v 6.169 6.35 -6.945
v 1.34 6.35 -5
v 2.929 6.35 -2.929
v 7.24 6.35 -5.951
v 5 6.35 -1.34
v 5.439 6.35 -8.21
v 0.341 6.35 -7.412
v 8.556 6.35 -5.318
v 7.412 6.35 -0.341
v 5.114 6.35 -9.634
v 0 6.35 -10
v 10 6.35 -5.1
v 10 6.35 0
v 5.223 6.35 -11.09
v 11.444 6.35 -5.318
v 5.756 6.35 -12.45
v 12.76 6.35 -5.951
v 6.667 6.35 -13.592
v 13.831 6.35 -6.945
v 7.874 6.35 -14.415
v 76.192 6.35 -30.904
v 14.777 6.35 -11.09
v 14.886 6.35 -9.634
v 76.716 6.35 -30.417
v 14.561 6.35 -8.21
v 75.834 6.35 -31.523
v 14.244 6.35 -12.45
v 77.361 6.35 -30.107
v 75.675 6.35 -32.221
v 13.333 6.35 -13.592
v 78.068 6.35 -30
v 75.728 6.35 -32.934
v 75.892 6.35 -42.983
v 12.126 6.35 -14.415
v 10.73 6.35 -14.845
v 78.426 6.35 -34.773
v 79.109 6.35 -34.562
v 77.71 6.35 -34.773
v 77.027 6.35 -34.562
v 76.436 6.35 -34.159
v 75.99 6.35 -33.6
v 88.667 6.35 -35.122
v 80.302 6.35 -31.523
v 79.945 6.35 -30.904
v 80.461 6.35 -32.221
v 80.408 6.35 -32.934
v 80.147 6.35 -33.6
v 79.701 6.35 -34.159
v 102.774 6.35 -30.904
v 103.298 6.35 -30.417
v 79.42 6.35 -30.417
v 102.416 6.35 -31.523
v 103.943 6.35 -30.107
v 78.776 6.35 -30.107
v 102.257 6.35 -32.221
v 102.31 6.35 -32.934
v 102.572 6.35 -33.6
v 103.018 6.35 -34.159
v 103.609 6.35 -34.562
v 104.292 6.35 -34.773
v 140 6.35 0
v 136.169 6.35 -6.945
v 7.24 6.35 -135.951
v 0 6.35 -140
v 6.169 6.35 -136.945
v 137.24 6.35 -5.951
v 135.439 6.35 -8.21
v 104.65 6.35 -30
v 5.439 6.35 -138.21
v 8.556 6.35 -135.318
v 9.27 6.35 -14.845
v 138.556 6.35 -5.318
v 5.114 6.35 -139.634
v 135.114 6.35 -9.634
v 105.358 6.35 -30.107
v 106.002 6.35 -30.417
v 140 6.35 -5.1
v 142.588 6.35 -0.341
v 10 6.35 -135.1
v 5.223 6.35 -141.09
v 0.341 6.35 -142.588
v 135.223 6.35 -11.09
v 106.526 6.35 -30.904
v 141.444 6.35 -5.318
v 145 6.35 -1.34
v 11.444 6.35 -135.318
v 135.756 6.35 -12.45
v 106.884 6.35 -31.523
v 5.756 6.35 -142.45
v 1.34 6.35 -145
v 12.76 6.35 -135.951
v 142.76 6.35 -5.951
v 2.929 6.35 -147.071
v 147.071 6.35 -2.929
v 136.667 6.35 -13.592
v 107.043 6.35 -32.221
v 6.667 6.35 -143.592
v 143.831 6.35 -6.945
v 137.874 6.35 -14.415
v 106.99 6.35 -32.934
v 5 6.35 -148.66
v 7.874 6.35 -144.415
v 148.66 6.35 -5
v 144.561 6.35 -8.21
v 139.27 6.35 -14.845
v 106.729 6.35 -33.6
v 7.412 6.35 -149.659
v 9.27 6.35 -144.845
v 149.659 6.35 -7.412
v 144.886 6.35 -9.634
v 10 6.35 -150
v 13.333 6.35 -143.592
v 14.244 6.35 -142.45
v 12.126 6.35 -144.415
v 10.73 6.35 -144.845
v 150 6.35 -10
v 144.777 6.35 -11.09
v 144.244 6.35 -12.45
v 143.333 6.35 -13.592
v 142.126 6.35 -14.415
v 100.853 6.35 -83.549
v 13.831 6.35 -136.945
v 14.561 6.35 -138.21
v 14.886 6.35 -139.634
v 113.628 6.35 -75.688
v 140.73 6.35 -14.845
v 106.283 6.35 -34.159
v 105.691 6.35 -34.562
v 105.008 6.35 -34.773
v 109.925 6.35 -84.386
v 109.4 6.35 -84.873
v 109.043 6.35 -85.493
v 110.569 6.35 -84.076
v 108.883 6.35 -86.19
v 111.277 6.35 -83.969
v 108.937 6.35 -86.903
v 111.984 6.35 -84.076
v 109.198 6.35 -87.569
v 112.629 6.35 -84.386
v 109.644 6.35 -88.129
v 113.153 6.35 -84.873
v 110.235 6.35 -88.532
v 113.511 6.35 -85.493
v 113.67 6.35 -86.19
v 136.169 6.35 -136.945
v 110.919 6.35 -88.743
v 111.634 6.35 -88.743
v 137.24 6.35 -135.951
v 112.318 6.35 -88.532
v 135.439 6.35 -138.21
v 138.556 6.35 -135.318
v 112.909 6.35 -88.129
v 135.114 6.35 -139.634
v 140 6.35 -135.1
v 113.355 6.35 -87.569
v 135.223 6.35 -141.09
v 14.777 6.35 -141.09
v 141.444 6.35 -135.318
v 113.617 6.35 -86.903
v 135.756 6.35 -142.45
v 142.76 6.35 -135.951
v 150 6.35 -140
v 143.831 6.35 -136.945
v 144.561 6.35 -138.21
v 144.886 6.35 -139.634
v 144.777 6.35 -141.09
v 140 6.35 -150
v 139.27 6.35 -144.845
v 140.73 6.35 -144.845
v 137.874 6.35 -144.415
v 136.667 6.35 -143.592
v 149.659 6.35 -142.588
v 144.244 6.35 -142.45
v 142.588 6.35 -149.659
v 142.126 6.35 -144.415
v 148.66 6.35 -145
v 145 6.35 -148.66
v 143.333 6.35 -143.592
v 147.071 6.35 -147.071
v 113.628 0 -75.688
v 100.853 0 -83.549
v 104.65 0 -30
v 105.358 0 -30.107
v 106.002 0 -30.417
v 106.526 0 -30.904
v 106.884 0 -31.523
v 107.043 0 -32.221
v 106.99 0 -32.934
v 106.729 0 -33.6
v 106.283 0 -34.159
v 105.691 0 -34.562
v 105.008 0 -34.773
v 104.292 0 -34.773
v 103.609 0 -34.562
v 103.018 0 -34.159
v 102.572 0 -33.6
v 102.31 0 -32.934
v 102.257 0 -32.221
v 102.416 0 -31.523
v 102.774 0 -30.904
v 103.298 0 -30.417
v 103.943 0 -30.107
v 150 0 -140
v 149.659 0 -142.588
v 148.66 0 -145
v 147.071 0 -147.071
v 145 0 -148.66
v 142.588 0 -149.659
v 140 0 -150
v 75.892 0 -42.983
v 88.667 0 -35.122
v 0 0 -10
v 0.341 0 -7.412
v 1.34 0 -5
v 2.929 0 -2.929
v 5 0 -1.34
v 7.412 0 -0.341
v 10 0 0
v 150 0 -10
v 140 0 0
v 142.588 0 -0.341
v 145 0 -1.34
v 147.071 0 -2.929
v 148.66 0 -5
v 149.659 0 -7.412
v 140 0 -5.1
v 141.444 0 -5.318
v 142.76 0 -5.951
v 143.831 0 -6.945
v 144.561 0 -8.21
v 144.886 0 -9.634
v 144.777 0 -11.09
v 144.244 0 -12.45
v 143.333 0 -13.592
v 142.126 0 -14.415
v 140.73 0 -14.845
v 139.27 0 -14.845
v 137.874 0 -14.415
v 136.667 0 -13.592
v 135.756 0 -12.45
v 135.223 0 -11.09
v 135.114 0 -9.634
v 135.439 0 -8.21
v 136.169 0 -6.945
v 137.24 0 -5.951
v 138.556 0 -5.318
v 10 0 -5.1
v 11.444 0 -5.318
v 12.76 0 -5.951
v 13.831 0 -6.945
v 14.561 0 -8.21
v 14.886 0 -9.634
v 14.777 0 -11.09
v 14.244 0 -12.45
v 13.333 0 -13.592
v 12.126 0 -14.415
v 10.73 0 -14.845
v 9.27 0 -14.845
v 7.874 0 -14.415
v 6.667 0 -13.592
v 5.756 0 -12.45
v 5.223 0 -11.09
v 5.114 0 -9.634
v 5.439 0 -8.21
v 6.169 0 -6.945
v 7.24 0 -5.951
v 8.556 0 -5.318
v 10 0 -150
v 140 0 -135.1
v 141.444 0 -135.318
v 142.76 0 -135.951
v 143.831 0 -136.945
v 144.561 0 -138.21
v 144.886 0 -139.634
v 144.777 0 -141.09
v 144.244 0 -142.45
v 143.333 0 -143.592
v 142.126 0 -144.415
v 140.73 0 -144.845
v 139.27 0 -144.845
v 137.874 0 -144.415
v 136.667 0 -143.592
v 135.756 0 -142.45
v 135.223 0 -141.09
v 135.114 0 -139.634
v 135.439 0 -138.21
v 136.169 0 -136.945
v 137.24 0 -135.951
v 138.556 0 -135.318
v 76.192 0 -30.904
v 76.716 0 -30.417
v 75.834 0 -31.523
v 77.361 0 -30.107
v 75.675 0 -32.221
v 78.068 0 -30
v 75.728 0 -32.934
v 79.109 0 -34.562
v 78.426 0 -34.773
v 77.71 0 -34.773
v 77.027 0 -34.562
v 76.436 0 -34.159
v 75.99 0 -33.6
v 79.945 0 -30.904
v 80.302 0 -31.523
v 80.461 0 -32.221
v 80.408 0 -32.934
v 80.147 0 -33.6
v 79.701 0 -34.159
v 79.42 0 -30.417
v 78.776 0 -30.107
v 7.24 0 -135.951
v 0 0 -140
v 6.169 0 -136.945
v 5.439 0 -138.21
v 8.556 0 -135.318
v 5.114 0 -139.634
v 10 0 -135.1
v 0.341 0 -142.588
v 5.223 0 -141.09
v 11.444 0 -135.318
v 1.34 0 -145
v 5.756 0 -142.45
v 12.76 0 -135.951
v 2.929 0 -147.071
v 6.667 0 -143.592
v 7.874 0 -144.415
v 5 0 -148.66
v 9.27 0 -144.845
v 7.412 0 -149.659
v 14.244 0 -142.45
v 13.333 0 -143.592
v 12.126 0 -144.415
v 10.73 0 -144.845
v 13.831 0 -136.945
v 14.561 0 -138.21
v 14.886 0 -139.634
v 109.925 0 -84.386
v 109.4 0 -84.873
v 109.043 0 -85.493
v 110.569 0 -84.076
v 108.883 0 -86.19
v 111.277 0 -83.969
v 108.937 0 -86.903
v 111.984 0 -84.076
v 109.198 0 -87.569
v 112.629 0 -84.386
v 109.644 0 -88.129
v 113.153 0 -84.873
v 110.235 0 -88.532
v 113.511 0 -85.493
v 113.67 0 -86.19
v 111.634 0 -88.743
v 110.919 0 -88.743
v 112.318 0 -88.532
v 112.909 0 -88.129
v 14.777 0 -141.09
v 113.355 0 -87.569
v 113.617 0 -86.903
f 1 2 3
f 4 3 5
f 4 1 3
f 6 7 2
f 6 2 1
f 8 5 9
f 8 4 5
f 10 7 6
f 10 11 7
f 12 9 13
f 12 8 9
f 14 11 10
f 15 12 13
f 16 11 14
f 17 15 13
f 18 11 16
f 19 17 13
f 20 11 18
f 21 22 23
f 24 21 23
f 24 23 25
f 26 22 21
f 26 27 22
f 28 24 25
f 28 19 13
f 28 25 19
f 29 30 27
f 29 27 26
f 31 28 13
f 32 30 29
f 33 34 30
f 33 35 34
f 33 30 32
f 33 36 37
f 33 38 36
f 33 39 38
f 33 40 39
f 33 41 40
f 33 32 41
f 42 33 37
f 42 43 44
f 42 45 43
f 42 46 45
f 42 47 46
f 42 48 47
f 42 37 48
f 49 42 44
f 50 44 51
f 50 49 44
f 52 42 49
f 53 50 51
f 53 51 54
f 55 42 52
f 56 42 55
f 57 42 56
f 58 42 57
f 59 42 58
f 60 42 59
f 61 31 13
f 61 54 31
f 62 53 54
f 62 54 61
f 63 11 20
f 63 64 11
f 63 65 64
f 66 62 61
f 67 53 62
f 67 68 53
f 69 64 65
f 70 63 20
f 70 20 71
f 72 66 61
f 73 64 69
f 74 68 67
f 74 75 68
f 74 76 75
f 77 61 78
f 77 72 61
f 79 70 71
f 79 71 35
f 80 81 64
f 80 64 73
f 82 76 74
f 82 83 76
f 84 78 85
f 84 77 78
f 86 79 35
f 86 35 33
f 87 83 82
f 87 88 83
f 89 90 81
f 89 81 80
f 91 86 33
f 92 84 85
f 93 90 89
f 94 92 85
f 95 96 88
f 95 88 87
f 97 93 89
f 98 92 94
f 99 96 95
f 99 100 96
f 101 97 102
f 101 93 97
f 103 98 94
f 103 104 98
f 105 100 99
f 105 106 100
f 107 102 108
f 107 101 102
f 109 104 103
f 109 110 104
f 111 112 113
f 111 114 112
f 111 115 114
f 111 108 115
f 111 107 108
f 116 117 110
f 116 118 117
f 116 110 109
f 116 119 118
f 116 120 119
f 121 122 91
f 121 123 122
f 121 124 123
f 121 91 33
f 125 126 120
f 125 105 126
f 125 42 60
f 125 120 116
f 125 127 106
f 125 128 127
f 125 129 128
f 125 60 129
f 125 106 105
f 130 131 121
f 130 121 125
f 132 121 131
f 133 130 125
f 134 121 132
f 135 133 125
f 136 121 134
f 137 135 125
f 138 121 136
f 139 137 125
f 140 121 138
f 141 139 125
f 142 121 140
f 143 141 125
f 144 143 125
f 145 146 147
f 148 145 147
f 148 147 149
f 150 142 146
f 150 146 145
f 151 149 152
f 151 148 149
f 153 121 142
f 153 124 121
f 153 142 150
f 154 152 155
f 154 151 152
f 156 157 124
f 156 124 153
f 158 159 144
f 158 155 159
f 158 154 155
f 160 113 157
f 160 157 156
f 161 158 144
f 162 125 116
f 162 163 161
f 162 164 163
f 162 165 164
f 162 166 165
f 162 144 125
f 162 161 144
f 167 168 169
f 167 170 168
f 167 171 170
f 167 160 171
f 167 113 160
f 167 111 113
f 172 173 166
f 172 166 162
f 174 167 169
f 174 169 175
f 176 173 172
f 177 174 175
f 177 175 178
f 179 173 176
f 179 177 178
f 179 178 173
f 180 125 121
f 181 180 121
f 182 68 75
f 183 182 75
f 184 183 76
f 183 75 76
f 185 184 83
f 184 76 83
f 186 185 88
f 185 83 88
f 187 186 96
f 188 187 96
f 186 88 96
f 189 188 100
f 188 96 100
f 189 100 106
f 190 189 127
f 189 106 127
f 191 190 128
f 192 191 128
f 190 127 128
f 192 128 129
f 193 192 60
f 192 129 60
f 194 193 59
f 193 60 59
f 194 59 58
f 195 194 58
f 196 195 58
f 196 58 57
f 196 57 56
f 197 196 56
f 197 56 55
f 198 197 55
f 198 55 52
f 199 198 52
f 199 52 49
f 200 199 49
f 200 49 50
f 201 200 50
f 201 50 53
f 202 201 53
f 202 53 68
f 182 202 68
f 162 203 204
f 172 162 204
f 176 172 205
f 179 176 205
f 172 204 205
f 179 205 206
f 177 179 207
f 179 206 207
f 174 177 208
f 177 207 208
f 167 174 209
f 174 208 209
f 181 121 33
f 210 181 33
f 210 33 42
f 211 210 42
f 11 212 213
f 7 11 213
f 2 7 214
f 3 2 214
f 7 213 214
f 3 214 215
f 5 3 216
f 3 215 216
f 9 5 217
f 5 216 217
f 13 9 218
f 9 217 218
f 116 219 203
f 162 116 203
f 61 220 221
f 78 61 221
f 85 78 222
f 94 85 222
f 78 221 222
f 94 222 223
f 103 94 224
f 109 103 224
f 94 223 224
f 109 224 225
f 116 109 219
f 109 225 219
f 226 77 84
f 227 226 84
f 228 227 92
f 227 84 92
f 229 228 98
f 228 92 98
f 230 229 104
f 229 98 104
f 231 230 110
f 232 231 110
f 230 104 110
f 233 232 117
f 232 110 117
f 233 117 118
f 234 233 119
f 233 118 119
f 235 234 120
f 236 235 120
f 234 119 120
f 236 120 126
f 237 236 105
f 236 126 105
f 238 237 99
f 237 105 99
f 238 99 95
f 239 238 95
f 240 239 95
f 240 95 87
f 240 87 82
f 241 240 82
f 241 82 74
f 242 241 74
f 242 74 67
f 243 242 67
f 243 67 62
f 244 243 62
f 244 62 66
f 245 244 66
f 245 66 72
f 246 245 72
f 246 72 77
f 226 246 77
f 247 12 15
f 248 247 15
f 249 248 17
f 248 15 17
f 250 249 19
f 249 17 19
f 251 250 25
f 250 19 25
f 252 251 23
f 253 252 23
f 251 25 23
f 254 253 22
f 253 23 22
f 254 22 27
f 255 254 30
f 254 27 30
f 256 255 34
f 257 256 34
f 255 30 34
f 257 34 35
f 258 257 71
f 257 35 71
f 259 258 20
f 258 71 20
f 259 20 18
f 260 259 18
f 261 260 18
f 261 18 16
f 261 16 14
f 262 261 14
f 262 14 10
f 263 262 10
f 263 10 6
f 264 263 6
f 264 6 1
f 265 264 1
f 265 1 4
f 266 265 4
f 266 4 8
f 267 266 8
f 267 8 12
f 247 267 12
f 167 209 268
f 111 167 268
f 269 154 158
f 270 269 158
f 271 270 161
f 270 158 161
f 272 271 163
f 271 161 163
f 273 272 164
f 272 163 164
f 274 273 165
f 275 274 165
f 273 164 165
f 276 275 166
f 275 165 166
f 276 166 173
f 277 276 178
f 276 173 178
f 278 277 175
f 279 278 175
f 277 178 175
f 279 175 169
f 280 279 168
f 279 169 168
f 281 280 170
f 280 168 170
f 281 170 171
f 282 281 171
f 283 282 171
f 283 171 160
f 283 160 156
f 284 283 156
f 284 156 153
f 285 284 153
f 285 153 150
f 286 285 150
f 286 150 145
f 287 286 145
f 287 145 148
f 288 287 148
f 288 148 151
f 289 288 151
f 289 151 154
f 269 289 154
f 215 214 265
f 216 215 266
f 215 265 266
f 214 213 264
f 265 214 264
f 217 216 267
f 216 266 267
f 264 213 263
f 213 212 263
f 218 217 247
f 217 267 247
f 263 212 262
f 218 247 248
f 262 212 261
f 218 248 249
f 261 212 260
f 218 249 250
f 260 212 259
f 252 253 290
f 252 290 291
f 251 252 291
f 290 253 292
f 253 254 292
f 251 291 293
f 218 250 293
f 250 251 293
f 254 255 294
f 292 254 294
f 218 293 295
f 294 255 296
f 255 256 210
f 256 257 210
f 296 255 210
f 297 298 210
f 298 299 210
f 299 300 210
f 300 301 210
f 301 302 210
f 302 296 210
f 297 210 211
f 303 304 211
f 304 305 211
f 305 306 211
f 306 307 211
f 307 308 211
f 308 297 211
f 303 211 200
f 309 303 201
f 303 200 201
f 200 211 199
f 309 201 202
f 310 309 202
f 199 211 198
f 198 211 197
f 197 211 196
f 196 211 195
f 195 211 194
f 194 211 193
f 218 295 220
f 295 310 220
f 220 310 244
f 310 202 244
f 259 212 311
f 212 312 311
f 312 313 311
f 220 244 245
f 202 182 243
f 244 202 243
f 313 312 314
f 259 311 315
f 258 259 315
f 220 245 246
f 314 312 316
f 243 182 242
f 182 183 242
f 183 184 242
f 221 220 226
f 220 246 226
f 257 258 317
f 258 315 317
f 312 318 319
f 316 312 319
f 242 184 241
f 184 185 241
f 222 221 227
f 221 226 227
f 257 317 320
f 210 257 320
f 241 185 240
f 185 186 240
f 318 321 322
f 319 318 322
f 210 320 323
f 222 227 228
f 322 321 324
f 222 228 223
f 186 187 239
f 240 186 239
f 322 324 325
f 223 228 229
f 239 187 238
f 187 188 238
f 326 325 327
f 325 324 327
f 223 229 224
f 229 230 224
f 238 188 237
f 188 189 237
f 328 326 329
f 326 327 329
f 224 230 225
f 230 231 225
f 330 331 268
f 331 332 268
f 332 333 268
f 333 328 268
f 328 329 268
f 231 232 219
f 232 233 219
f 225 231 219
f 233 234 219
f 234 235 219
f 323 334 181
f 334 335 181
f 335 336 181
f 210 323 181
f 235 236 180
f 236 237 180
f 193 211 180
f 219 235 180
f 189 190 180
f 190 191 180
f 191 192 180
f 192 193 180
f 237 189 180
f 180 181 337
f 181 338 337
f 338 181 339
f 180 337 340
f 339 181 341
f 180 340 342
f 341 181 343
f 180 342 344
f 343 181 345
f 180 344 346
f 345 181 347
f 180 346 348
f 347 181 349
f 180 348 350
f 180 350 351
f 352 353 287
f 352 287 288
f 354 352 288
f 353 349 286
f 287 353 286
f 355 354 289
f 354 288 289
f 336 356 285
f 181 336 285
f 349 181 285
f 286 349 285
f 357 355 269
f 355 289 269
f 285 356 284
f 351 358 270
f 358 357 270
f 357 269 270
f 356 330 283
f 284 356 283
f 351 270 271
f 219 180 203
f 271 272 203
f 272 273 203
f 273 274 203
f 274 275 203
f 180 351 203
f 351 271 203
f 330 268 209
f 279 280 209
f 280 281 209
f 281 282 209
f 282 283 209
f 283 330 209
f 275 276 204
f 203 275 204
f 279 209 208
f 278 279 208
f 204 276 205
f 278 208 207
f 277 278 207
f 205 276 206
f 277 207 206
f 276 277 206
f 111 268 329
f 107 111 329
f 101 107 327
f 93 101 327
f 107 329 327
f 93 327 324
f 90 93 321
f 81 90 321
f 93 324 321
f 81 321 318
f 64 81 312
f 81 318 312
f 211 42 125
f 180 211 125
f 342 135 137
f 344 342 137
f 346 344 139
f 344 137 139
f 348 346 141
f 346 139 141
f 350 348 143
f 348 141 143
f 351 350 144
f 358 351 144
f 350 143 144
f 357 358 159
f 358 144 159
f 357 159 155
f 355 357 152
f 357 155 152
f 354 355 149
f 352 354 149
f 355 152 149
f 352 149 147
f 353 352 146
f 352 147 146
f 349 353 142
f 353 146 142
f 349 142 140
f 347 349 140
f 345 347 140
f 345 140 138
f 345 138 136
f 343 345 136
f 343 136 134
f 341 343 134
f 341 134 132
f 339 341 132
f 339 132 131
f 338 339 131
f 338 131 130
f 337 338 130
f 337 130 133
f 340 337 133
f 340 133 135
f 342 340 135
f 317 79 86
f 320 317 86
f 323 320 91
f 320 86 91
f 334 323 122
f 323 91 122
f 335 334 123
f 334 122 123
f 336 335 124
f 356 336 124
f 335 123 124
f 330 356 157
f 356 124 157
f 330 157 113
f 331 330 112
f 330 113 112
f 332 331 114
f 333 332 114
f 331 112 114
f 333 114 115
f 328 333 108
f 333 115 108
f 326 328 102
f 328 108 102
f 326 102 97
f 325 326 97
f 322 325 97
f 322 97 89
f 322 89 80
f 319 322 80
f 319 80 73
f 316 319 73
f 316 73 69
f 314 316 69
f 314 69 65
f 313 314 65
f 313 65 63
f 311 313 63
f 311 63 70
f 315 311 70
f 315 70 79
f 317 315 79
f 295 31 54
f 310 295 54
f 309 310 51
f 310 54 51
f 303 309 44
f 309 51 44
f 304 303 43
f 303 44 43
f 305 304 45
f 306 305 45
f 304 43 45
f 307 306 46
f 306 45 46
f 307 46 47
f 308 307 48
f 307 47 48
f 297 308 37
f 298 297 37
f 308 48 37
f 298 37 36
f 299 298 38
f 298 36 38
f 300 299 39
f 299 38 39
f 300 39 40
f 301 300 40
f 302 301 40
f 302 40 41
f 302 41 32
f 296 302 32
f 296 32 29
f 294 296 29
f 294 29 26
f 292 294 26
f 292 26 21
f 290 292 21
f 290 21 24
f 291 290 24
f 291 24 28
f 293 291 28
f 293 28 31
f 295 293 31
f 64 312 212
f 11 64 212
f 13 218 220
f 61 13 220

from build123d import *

# Parameters (mm, degrees)
BOSS_EXTRUDE1_DEPTH = 6.35
SKETCH2_R           = 2.4
SKETCH2_R_2         = 4.9
CUT_EXTRUDE1_DEPTH  = 213.227054119


with BuildPart() as part:
    # Sketch1 → Boss-Extrude1 (new body)
    with BuildSketch(Plane(origin=(0, 0, 0), x_dir=(1, 0, 0), z_dir=(0, 1, 0))):
        with BuildLine():
            Line((10, 0), (140, 0))
            ThreePointArc((140, 0), (147.071067812, 2.928932188), (150, 10))
            Line((150, 10), (150, 140))
            ThreePointArc((150, 140), (147.071067812, 147.071067812), (140, 150))
            Line((140, 150), (10, 150))
            ThreePointArc((10, 150), (2.928932188, 147.071067812), (0, 140))
            Line((0, 140), (0, 10))
            ThreePointArc((0, 10), (2.928932188, 2.928932188), (10, 0))
        make_face()
    extrude(amount=BOSS_EXTRUDE1_DEPTH)

    # Sketch2 → Cut-Extrude1 (cut, through all)
    with BuildSketch(Plane(origin=(0, 6.35, 0), x_dir=(1, 0, 0), z_dir=(0, 1, 0))):
        with Locations(Location((78.068159546, 32.4, 0), (0, 0, 270))):
            Circle(SKETCH2_R)
        with Locations(Location((104.650093785, 32.4, 0), (0, 0, 270))):
            Circle(SKETCH2_R)
        with Locations(Location((111.276700611, 86.369381637, 0), (0, 0, 270))):
            Circle(SKETCH2_R)
        with Locations(Location((10, 140, 0), (0, 0, 270))):
            Circle(SKETCH2_R_2)
        with Locations(Location((10, 10, 0), (0, 0, 270))):
            Circle(SKETCH2_R_2)
        with Locations(Location((140, 140, 0), (0, 0, 270))):
            Circle(SKETCH2_R_2)
        with Locations(Location((140, 10, 0), (0, 0, 270))):
            Circle(SKETCH2_R_2)
        Polygon((75.891616838, 42.983313926), (88.666849341, 35.122433917), (113.627763661, 75.688055524), (100.852531159, 83.548935532), align=None)
    extrude(amount=-CUT_EXTRUDE1_DEPTH, mode=Mode.SUBTRACT)


solid = part.part
